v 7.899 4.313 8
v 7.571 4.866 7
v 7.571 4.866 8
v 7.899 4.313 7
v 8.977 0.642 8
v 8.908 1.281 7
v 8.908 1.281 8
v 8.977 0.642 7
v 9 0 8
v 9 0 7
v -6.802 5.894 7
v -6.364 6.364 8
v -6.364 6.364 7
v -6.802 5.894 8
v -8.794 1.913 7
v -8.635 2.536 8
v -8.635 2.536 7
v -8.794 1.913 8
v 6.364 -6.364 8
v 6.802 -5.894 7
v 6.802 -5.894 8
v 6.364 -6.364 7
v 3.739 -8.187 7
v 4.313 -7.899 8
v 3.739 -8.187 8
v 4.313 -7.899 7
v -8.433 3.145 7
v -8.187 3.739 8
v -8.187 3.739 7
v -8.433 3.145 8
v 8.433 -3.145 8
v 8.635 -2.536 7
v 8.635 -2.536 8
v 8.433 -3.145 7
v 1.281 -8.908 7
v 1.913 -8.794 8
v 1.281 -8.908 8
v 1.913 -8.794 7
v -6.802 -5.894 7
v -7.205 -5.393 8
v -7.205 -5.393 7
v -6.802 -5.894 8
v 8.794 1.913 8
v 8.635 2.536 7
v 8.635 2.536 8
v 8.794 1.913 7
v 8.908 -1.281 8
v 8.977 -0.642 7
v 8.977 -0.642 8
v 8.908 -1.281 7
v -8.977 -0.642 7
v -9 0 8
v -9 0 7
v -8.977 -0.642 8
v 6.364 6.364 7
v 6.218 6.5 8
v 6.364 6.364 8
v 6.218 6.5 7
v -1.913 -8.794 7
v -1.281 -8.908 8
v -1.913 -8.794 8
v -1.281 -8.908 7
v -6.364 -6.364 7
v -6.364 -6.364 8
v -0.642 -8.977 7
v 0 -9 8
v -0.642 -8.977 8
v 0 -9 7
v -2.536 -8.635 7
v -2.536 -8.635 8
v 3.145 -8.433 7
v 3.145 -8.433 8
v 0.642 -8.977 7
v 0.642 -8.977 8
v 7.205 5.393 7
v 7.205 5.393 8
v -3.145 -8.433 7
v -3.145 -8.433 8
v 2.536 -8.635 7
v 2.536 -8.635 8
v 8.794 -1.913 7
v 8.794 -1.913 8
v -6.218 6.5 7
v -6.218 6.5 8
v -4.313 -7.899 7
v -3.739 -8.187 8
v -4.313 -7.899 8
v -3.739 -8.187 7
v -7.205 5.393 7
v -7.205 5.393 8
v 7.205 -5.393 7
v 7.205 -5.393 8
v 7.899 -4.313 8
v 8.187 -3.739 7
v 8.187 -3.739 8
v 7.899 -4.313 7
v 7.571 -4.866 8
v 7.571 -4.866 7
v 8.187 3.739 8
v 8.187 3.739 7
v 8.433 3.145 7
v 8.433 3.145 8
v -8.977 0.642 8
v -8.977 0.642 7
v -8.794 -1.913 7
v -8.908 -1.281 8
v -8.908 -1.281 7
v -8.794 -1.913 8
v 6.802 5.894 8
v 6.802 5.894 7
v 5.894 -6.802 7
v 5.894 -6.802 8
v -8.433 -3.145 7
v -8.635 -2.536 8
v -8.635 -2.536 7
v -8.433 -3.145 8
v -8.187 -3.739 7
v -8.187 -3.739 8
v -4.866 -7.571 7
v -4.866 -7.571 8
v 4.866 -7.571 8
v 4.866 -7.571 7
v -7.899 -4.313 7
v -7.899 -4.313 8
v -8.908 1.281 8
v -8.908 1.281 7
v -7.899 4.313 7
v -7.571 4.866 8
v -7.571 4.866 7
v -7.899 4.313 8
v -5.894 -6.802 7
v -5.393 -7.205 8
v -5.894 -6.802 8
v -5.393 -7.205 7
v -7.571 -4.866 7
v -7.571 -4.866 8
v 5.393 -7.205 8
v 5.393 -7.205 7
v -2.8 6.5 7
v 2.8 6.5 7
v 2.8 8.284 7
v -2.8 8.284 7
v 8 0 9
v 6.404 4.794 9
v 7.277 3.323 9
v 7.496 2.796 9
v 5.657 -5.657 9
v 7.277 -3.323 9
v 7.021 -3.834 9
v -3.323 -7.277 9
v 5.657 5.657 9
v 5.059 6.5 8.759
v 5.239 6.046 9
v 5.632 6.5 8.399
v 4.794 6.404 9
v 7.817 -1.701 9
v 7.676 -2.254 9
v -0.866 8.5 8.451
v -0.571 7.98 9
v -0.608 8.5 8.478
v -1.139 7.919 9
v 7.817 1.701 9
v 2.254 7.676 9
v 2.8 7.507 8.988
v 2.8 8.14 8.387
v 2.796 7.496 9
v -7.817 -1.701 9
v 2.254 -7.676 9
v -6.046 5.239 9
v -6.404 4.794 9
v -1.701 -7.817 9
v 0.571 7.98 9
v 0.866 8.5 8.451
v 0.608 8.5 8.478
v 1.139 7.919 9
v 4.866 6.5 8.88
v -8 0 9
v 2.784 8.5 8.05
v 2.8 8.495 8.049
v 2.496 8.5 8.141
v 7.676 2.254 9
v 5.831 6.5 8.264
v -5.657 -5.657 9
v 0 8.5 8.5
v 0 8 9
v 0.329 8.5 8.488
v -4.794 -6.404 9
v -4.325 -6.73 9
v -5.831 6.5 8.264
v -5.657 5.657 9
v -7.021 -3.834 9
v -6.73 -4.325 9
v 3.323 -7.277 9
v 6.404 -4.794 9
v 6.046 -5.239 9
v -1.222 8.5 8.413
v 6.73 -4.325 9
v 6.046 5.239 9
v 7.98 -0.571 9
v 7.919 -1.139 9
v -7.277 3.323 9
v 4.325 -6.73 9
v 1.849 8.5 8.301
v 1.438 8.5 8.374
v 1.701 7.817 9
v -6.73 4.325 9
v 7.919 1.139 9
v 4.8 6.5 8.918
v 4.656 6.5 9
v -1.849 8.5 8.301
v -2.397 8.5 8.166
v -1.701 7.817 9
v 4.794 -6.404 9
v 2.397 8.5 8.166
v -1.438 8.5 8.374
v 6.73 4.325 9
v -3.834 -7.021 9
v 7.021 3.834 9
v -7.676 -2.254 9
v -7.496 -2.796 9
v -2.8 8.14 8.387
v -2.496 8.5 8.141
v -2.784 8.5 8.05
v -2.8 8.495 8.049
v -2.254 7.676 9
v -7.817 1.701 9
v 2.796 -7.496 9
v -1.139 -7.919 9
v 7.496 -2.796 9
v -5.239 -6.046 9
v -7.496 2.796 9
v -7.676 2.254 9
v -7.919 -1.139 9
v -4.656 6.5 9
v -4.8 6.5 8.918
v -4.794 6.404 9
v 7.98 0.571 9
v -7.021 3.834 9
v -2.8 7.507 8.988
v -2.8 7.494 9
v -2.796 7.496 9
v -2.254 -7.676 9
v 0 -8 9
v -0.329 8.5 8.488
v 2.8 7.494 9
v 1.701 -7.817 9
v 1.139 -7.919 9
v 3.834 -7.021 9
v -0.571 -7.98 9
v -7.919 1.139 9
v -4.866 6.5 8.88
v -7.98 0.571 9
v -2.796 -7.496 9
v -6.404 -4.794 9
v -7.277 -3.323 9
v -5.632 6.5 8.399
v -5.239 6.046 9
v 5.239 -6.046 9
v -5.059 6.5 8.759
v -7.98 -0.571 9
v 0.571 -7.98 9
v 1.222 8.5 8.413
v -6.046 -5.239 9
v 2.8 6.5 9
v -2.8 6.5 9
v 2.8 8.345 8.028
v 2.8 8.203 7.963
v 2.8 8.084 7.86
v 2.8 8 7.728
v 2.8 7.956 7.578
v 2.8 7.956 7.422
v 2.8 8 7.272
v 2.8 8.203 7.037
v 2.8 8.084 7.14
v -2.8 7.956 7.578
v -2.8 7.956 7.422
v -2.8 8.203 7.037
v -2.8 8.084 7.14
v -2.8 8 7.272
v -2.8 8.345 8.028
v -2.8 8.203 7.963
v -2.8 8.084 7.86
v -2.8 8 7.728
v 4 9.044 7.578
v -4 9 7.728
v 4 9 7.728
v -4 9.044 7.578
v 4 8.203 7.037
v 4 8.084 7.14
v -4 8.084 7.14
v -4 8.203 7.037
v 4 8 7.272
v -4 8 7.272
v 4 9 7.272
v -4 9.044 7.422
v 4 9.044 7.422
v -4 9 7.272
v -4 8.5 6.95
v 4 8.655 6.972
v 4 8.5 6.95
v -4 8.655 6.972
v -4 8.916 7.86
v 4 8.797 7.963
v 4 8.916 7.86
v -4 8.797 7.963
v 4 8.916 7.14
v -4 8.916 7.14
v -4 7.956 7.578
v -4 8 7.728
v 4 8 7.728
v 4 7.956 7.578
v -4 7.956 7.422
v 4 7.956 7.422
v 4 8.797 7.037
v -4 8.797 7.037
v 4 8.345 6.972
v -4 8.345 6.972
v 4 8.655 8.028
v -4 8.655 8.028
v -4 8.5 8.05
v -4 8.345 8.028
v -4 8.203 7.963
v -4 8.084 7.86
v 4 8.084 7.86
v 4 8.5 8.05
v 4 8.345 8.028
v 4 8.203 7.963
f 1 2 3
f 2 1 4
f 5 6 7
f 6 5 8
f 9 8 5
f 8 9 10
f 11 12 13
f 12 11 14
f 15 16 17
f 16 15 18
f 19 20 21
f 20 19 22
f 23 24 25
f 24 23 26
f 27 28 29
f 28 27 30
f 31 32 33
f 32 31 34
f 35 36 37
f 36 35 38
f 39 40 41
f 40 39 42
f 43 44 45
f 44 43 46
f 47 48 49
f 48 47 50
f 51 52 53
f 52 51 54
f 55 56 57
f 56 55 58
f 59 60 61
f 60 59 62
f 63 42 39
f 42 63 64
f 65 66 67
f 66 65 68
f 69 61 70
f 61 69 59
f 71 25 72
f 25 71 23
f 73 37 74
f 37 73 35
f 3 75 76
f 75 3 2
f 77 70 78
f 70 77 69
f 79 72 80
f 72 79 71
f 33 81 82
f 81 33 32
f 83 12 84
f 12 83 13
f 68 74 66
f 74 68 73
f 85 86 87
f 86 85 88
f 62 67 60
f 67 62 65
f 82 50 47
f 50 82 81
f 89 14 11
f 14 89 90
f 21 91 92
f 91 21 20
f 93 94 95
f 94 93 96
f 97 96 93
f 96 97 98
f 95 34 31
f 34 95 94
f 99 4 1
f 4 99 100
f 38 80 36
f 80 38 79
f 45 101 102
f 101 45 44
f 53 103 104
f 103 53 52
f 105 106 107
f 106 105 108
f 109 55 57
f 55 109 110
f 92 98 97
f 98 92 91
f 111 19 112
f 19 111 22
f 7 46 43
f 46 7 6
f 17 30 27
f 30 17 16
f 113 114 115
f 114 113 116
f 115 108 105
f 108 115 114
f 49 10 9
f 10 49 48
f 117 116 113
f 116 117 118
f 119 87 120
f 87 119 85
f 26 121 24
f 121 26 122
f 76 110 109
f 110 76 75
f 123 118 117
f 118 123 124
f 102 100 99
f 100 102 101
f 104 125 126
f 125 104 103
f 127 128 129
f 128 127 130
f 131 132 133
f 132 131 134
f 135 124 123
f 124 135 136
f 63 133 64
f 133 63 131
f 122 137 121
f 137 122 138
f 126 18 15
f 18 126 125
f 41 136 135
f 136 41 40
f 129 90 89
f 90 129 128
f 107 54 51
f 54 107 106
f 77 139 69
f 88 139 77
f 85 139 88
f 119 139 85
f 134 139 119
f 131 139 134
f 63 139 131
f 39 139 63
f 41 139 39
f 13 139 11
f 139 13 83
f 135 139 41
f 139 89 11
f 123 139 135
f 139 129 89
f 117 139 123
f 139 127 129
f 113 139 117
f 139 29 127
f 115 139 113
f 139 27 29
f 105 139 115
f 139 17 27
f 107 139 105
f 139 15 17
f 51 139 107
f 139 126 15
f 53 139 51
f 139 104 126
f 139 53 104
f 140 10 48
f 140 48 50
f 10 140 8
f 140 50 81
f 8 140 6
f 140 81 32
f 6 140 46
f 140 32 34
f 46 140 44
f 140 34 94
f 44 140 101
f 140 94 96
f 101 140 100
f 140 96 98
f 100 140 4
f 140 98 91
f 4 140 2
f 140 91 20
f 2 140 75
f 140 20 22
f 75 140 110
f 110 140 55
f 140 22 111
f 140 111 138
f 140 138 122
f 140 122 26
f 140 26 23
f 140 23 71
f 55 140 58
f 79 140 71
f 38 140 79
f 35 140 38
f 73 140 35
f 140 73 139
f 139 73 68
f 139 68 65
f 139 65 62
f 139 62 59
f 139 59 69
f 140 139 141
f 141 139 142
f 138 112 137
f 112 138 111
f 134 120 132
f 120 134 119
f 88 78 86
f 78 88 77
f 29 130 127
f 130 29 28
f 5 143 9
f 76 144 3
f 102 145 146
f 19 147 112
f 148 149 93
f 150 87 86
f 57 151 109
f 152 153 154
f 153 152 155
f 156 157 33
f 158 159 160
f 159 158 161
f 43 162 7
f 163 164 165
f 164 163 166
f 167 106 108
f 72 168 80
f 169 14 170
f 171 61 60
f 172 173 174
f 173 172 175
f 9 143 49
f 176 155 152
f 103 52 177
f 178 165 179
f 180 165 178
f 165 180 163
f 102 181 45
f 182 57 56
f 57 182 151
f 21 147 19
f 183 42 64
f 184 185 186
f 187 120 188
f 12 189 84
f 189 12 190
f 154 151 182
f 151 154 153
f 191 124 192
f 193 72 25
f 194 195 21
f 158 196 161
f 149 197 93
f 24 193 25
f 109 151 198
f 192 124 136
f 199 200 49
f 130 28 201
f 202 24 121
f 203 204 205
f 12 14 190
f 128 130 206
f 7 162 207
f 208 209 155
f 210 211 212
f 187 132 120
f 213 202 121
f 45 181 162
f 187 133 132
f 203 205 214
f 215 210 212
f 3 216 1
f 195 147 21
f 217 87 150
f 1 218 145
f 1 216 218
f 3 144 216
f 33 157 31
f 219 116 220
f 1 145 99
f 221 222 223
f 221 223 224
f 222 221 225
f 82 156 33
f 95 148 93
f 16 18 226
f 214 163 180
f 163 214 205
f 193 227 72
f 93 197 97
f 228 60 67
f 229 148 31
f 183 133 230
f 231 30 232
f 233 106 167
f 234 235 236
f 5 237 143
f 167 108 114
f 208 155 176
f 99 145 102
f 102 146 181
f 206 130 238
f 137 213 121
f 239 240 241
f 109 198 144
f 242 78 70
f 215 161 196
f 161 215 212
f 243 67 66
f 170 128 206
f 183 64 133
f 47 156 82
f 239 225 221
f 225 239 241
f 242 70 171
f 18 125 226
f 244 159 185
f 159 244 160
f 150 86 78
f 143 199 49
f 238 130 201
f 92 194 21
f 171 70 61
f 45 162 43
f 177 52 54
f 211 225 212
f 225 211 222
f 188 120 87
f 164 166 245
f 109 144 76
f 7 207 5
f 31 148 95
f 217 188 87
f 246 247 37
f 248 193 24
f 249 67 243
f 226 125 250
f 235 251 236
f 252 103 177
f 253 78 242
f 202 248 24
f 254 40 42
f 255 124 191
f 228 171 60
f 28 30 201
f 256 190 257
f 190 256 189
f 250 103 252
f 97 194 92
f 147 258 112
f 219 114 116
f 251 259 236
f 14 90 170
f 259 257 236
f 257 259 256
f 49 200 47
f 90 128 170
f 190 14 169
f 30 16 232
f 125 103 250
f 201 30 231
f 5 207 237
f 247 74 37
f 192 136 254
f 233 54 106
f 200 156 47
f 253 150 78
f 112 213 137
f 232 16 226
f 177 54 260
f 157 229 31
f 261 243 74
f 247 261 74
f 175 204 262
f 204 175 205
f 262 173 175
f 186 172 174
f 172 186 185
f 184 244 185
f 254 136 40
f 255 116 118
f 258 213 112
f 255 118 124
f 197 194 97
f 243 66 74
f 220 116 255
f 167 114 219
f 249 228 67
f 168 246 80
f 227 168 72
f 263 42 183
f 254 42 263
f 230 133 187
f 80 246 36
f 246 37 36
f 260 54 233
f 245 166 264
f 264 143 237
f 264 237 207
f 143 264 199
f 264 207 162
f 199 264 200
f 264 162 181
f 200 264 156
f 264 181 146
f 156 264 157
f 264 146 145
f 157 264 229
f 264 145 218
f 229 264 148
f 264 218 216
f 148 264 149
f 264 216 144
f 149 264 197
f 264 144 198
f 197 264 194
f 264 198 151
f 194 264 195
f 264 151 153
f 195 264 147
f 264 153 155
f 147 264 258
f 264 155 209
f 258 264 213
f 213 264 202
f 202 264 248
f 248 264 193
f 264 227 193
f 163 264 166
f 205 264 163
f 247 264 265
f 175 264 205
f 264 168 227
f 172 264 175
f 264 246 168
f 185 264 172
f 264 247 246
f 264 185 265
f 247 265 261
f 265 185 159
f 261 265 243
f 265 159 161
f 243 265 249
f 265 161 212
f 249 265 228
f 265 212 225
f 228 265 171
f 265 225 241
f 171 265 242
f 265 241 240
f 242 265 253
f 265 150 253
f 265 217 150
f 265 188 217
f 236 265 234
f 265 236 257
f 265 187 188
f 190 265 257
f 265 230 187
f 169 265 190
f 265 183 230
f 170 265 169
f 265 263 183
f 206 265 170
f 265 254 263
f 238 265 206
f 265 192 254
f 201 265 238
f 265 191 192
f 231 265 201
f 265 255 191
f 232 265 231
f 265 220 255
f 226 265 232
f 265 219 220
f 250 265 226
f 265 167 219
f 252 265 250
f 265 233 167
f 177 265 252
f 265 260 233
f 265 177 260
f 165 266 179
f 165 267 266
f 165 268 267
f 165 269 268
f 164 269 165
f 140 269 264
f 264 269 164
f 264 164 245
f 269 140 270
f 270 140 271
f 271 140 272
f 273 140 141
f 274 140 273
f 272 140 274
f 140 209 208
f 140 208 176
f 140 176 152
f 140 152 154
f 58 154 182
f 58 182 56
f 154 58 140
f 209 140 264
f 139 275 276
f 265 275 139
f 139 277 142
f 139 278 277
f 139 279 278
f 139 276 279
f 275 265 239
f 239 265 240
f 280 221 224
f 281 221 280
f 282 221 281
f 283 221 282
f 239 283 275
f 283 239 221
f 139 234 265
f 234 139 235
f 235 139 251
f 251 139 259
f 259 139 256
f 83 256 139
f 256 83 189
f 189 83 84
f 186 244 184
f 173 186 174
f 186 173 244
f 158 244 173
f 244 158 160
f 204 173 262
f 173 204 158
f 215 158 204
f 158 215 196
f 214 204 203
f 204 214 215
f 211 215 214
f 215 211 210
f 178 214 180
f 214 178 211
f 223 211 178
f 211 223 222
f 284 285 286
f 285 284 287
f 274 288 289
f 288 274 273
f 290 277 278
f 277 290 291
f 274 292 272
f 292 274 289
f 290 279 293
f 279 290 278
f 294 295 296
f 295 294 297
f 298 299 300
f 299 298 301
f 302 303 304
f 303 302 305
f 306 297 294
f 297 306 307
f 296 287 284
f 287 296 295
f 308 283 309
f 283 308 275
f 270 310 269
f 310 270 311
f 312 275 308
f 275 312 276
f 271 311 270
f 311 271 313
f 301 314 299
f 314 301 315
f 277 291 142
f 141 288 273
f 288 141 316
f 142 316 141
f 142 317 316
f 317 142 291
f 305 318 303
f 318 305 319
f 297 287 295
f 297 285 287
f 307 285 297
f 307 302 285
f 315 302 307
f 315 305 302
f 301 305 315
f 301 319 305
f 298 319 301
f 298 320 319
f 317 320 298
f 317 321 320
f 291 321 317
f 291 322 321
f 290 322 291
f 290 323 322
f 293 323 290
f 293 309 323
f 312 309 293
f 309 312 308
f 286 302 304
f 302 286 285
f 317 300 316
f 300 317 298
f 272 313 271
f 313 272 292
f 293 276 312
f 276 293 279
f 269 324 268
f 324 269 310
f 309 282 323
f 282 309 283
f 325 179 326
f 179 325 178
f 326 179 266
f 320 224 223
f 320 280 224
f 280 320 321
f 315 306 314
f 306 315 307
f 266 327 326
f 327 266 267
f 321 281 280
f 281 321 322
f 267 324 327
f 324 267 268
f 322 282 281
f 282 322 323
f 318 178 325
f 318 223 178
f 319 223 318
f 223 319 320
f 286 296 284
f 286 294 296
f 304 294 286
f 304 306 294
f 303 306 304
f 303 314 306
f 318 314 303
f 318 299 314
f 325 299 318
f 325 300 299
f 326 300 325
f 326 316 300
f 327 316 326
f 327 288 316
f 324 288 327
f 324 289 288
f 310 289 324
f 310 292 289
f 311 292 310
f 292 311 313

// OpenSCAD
//================================================
// Sensor1a 
// Housing for the IR sensors for 12v leds
//

//----------------------------------------------
module eye1(){
    
difference(){
    union(){
    cylinder(r=9,h=7,$fn=88);
    cylinder(r1=10,r2=9,h=2,$fn=88);
        
    hull(){
        color("cyan")
        translate([5,8,0])
        cylinder(r=1,h=9,$fn=22);

        color("pink")
        translate([-5,8,0])
        cylinder(r=1,h=9,$fn=22);
    }   // end of hull
    
    }   // end of union
    
    // conical cut
    color("green")
    translate([0,0,4.5])
    cylinder(r1=3,r2=8,h=2.6,$fn=88);

    // square cut for body of sensor
    color("red")
    translate([-3.5,-11,-1])
    cube([7,16,6]);

    // cut for hinge square
    color("red")
    translate([-3,5,7])
    cube([6,6,3]);

    // cut for hinge cylinder
    color("pink")
    translate([-4.5,8.5,7.5])
    rotate([0,90,0])
    cylinder(r=0.75,h=9,$fn=22);

}   // end of difference


}   // end of module eye1

//----------------------------------------------
module lid1(){

    difference(){
        union(){
            color("orange")
            translate([0,0,7])
            cylinder(r=9,h=1,$fn=88);
            color("orange")
            translate([0,0,8])
            cylinder(r1=9,r2=8,h=1,$fn=88);
        }
        // cut for hinge square
        color("red")
        translate([2.8,6.5,7])
        cube([4,4,3]);

        color("red")
        translate([-2.8-4,6.5,7])
        cube([4,4,3]);

        color("red")
        translate([-8,8.5,7])
        cube([12,4,3]);
    }

    // hinge
    color("pink")
    translate([-4,8.5,7.5])
    rotate([0,90,0])
    cylinder(r=0.55,h=8,$fn=22);


}   // end of module lid1

//================================================


// left side
//eye1();
lid1();

/*

// right side
translate([20,0,0]){
    eye1();
//    lid1();
}

// base
difference(){
    hull(){
        translate([0,0,-1])
        cylinder(r1=11,r2=10.5,h=1,$fn=88);

        translate([20,0,-1])
        cylinder(r1=11,r2=10.5,h=1,$fn=88);
    }
    
    translate([10,-7.5,-1.5])
    cylinder(r1=1,r2=2,h=2,$fn=44);

    translate([10,7.5,-1.5])
    cylinder(r1=1,r2=2,h=2,$fn=44);

}

*/
//================================================
